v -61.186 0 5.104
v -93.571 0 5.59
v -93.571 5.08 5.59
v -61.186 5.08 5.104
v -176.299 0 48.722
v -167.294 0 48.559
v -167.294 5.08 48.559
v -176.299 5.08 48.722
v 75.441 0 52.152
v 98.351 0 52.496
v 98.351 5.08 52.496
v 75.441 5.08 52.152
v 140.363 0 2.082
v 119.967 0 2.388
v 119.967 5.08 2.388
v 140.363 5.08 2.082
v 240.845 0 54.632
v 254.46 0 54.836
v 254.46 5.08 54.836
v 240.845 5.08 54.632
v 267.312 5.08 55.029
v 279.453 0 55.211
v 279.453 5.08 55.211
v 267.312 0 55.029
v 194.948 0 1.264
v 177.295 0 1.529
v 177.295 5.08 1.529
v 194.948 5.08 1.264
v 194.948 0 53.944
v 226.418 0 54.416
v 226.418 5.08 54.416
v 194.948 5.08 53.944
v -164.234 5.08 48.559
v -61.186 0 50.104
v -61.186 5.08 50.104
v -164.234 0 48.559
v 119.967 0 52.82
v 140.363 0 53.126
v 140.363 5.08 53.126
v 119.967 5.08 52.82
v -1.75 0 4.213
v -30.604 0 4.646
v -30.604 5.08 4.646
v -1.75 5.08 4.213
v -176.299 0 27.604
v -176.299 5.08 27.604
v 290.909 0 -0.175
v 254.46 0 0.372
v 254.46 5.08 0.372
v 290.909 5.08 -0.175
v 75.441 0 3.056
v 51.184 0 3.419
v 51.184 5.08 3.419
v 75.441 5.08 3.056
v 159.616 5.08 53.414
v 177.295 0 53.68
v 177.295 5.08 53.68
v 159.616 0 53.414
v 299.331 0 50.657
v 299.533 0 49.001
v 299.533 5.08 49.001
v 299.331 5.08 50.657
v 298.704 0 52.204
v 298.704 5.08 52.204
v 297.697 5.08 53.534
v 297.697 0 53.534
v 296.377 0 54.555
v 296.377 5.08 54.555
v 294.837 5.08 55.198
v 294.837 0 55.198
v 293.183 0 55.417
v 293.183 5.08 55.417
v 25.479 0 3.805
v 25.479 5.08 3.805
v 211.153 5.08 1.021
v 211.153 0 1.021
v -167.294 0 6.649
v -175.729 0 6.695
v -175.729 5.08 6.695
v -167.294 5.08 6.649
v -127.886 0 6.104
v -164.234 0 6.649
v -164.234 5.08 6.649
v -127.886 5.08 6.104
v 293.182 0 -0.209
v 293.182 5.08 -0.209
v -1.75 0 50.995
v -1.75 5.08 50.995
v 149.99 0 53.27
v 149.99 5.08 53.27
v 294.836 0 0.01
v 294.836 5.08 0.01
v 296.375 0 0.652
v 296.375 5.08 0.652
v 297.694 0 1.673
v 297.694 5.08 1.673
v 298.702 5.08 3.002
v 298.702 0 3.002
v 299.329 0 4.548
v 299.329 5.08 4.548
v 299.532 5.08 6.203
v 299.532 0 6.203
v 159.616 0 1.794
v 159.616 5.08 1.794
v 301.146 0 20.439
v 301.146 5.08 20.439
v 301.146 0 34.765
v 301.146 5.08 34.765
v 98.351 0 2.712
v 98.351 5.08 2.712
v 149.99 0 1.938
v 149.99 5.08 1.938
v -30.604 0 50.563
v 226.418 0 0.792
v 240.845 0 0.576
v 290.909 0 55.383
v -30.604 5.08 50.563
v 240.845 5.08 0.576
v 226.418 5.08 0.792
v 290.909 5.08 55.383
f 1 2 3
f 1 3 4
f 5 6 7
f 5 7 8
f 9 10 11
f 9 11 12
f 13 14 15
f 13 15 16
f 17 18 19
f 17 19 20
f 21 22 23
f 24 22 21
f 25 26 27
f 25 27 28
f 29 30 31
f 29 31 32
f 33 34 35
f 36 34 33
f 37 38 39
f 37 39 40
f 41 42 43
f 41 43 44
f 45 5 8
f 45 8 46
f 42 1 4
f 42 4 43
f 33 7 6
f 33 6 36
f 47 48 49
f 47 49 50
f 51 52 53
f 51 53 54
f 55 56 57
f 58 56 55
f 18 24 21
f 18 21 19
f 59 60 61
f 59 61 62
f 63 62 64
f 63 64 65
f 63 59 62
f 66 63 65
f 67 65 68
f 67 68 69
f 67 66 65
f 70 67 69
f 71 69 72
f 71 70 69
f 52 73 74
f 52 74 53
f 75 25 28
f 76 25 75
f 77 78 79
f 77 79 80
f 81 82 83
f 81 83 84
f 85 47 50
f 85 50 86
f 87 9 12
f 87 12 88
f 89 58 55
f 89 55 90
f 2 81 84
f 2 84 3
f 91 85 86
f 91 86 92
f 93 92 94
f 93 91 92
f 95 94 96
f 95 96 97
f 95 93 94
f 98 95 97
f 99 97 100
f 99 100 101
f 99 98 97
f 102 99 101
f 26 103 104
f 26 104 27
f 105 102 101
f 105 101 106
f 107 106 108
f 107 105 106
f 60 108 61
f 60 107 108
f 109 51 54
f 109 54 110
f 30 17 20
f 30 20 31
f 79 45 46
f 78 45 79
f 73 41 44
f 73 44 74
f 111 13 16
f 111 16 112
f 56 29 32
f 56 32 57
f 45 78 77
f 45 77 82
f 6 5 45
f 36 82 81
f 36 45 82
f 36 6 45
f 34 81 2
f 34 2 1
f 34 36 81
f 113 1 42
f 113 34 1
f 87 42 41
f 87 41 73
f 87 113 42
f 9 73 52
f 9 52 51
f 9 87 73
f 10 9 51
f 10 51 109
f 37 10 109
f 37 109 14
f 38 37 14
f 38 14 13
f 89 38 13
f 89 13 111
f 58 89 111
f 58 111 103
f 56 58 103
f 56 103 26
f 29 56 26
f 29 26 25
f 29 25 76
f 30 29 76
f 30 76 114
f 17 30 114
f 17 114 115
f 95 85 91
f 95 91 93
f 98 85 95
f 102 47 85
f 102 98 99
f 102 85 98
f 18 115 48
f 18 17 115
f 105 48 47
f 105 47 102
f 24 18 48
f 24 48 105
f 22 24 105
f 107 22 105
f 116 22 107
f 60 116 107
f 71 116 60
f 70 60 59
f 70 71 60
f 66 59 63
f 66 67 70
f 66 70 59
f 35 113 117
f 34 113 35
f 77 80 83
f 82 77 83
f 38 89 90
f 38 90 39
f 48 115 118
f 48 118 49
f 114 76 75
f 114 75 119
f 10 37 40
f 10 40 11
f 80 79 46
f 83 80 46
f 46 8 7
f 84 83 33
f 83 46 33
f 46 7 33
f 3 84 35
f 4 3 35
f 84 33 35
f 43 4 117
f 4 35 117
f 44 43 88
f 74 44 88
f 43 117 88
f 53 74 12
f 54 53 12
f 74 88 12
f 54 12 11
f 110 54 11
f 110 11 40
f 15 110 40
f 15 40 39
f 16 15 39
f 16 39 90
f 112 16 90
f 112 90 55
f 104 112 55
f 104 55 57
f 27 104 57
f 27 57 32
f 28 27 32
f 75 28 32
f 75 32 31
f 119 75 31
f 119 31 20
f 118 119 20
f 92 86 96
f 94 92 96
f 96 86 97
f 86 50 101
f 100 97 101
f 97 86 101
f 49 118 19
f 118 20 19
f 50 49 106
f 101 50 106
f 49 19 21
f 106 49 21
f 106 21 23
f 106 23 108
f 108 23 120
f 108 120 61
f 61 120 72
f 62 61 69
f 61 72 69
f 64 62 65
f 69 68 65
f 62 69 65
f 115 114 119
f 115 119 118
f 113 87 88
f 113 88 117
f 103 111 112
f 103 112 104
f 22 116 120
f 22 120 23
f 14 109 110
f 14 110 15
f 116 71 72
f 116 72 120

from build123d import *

# Parameters (mm, degrees)
F0_W     = 3.0600779591
F0_H     = 20.955
F1_DEPTH = 5.08


# Not quite as in the source:
# - a feature names something its author has since deleted; it is built from what else it names


with BuildPart() as f1:
    # F0 (on Front) → F1 (new body)
    with BuildSketch(Plane.XZ):
        with BuildLine():
            Line((211.1527612069, 54.1871569779), (194.9475612069, 53.9441942956))
            Line((194.9475612069, 53.9441942956), (194.9475612069, 27.6040292631))
            Line((194.9475612069, 27.6040292631), (199.8751612069, 27.6040292631))
            ThreePointArc((199.8751612069, 27.6040292631), (203.0501612069, 30.7790292631), (206.2251612069, 27.6040292631))
            Line((206.2251612069, 27.6040292631), (211.1527612069, 27.6040292631))
            Line((211.1527612069, 27.6040292631), (211.1527612069, 54.1871569779))
        make_face()
        with BuildLine():
            Line((35.1561612069, 27.6040292631), (25.4787612069, 27.6040292631))
            Line((25.4787612069, 27.6040292631), (25.4787612069, 3.8046848733))
            Line((25.4787612069, 3.8046848733), (51.1835612069, 3.4192950591))
            Line((51.1835612069, 3.4192950591), (51.1835612069, 27.6040292631))
            Line((51.1835612069, 27.6040292631), (41.5061612069, 27.6040292631))
            ThreePointArc((41.5061612069, 27.6040292631), (38.3311612069, 24.4290292631), (35.1561612069, 27.6040292631))
        make_face()
        Polygon((75.4405612069, 52.1524397183), (51.1835612069, 51.7887573333), (51.1835612069, 27.6040292631), (75.4405612069, 27.6040292631), align=None)
        Polygon((119.9667612069, 52.8200158658), (98.3513612069, 52.4959386829), (98.3513612069, 27.6040292631), (119.9667612069, 27.6040292631), align=None)
        Polygon((-127.8864387931, 6.1040758796), (-93.5710387931, 5.589588094), (-93.5710387931, 27.6040292631), (-127.8864387931, 27.6040292631), align=None)
        with BuildLine():
            ThreePointArc((-19.3522387931, 27.6040292631), (-16.1772387931, 30.7790292631), (-13.0022387931, 27.6040292631))
            Line((-13.0022387931, 27.6040292631), (-1.7500387931, 27.6040292631))
            Line((-1.7500387931, 27.6040292631), (-1.7500387931, 50.9951300136))
            Line((-1.7500387931, 50.9951300136), (-30.6044387931, 50.5625193442))
            Line((-30.6044387931, 50.5625193442), (-30.6044387931, 27.6040292631))
            Line((-30.6044387931, 27.6040292631), (-19.3522387931, 27.6040292631))
        make_face()
        Polygon((-93.5710387931, 27.6040292631), (-93.5710387931, 49.6184684202), (-127.8864387931, 49.1039816117), (-127.8864387931, 27.6040292631), align=None)
        Polygon((-30.6044387931, 4.6455353771), (-30.6044387931, 27.6040292631), (-61.1860387931, 27.6040292631), (-61.1860387931, 5.1040426264), align=None)
        Polygon((51.1835612069, 27.6040292631), (51.1835612069, 3.4192950591), (75.4405612069, 3.0556119834), (75.4405612069, 27.6040292631), align=None)
        Polygon((119.9667612069, 27.6040292631), (119.9667612069, 2.388034568), (140.3629612069, 2.0822361285), (140.3629612069, 14.6379053581), (140.3629612069, 27.6040292631), align=None)
        Polygon((98.3513612069, 27.6040292631), (98.3513612069, 2.7121123663), (119.9667612069, 2.388034568), (119.9667612069, 27.6040292631), align=None)
        with BuildLine():
            Line((-74.2035387931, 27.6040292631), (-61.1860387931, 27.6040292631))
            Line((-61.1860387931, 27.6040292631), (-61.1860387931, 50.1040129656))
            Line((-61.1860387931, 50.1040129656), (-93.5710387931, 49.6184684202))
            Line((-93.5710387931, 49.6184684202), (-93.5710387931, 27.6040292631))
            Line((-93.5710387931, 27.6040292631), (-80.5535387931, 27.6040292631))
            ThreePointArc((-80.5535387931, 27.6040292631), (-77.3785387931, 30.7790292631), (-74.2035387931, 27.6040292631))
        make_face()
        with BuildLine():
            Line((25.4787612069, 51.403368251), (25.4787612069, 27.6040292631))
            Line((25.4787612069, 27.6040292631), (35.1561612069, 27.6040292631))
            ThreePointArc((35.1561612069, 27.6040292631), (38.3311612069, 30.7790292631), (41.5061612069, 27.6040292631))
            Line((41.5061612069, 27.6040292631), (51.1835612069, 27.6040292631))
            Line((51.1835612069, 27.6040292631), (51.1835612069, 51.7887573333))
            Line((51.1835612069, 51.7887573333), (25.4787612069, 51.403368251))
        make_face()
        Polygon((-61.1860387931, 27.6040292631), (-30.6044387931, 27.6040292631), (-30.6044387931, 50.5625193442), (-61.1860387931, 50.1040129656), align=None)
        Polygon((-164.2338387931, 6.6490292631), (-127.8864387931, 6.1040758796), (-127.8864387931, 27.6040292631), (-164.2338387931, 27.6040292631), align=None)
        with BuildLine():
            Line((-167.2939167522, 27.6040292631), (-167.2939167522, 48.5590292631))
            add(Edge.make_bspline(
                [(-167.2939167522, 48.5590292631), (-169.3608924509, 48.5160966839), (-172.2759226046, 48.4555494006), (-175.4017391189, 48.6513352899), (-176.2988387931, 48.7219685213)],
                knots=[0, 0, 0, 0, 0.0767284167, 0.1082616947, 0.1082616947, 0.1082616947, 0.1082616947], degree=3))
            Line((-176.2988387931, 48.7219685213), (-176.2988387931, 27.6040292631))
            Line((-176.2988387931, 27.6040292631), (-167.2939167522, 27.6040292631))
        make_face()
        with BuildLine():
            Line((75.4405612069, 27.6040292631), (75.4405612069, 3.0556119834))
            Line((75.4405612069, 3.0556119834), (98.3513612069, 2.7121123663))
            Line((98.3513612069, 2.7121123663), (98.3513612069, 27.6040292631))
            Line((98.3513612069, 27.6040292631), (90.0709612069, 27.6040292631))
            ThreePointArc((90.0709612069, 27.6040292631), (86.8959612069, 24.4290292631), (83.7209612069, 27.6040292631))
            Line((83.7209612069, 27.6040292631), (75.4405612069, 27.6040292631))
        make_face()
        Polygon((177.2945612069, 27.6040292631), (177.2945612069, 1.5285238855), (194.9475612069, 1.2638540032), (194.9475612069, 27.6040292631), align=None)
        with BuildLine():
            Line((98.3513612069, 52.4959386829), (75.4405612069, 52.1524397183))
            Line((75.4405612069, 52.1524397183), (75.4405612069, 27.6040292631))
            Line((75.4405612069, 27.6040292631), (83.7209612069, 27.6040292631))
            ThreePointArc((83.7209612069, 27.6040292631), (86.8959612069, 30.7790292631), (90.0709612069, 27.6040292631))
            Line((90.0709612069, 27.6040292631), (98.3513612069, 27.6040292631))
            Line((98.3513612069, 27.6040292631), (98.3513612069, 52.4959386829))
        make_face()
        with BuildLine():
            Line((194.9475612069, 27.6040292631), (194.9475612069, 1.2638540032))
            Line((194.9475612069, 1.2638540032), (211.1527612069, 1.0208908594))
            Line((211.1527612069, 1.0208908594), (211.1527612069, 27.6040292631))
            Line((211.1527612069, 27.6040292631), (206.2251612069, 27.6040292631))
            ThreePointArc((206.2251612069, 27.6040292631), (203.0501612069, 24.4290292631), (199.8751612069, 27.6040292631))
            Line((199.8751612069, 27.6040292631), (194.9475612069, 27.6040292631))
        make_face()
        Polygon((-127.8864387931, 27.6040292631), (-127.8864387931, 49.1039816117), (-164.2338387931, 48.5590292631), (-164.2338387931, 27.6040292631), align=None)
        Polygon((140.3629612069, 53.1258137246), (119.9667612069, 52.8200158658), (119.9667612069, 27.6040292631), (140.3629612069, 27.6040292631), (140.3629612069, 40.5701442208), align=None)
        with BuildLine():
            Line((-1.7500387931, 27.6040292631), (-13.0022387931, 27.6040292631))
            ThreePointArc((-13.0022387931, 27.6040292631), (-16.1772387931, 24.4290292631), (-19.3522387931, 27.6040292631))
            Line((-19.3522387931, 27.6040292631), (-30.6044387931, 27.6040292631))
            Line((-30.6044387931, 27.6040292631), (-30.6044387931, 4.6455353771))
            Line((-30.6044387931, 4.6455353771), (-1.7500387931, 4.212923886))
            Line((-1.7500387931, 4.212923886), (-1.7500387931, 27.6040292631))
        make_face()
        Polygon((267.3121612069, 27.6040292631), (267.3121612069, 0.1788978957), (279.4533612069, -0.0031340521), (279.4533612069, 27.6040292631), align=None)
        Polygon((194.9475612069, 53.9441942956), (177.2945612069, 53.679524916), (177.2945612069, 27.6040292631), (194.9475612069, 27.6040292631), align=None)
        with BuildLine():
            Line((290.9087612069, 55.382929427), (279.4533612069, 55.2111799446))
            Line((279.4533612069, 55.2111799446), (279.4533612069, 27.6040292631))
            Line((279.4533612069, 27.6040292631), (282.0060612069, 27.6040292631))
            ThreePointArc((282.0060612069, 27.6040292631), (285.1810612069, 30.7790292631), (288.3560612069, 27.6040292631))
            Line((288.3560612069, 27.6040292631), (290.9087612069, 27.6040292631))
            Line((290.9087612069, 27.6040292631), (290.9087612069, 55.382929427))
        make_face()
        Polygon((279.4533612069, 55.2111799446), (267.3121612069, 55.0291483425), (267.3121612069, 27.6040292631), (279.4533612069, 27.6040292631), align=None)
        Polygon((177.2945612069, 53.679524916), (159.6161612069, 53.4144747171), (159.6161612069, 40.5701442208), (159.6161612069, 27.6040292631), (177.2945612069, 27.6040292631), align=None)
        with BuildLine():
            Line((140.3629612069, 14.6379053581), (140.3629612069, 2.0822361285))
            Line((140.3629612069, 2.0822361285), (149.9895612069, 1.9379053581))
            Line((149.9895612069, 1.9379053581), (149.9895612069, 11.4629053581))
            ThreePointArc((149.9895612069, 11.4629053581), (147.7444971767, 12.3928413278), (146.8145612069, 14.6379053581))
            Line((146.8145612069, 14.6379053581), (140.3629612069, 14.6379053581))
        make_face()
        with BuildLine():
            Line((226.4181612069, 27.6040292631), (226.4181612069, 0.7920180547))
            Line((226.4181612069, 0.7920180547), (240.8453612069, 0.5757123092))
            Line((240.8453612069, 0.5757123092), (240.8453612069, 27.6040292631))
            Line((240.8453612069, 27.6040292631), (236.8067612069, 27.6040292631))
            ThreePointArc((236.8067612069, 27.6040292631), (233.6317612069, 24.4290292631), (230.4567612069, 27.6040292631))
            Line((230.4567612069, 27.6040292631), (226.4181612069, 27.6040292631))
        make_face()
        Polygon((211.1527612069, 27.6040292631), (211.1527612069, 1.0208908594), (226.4181612069, 0.7920180547), (226.4181612069, 27.6040292631), align=None)
        Polygon((254.4597612069, 54.8364538014), (240.8453612069, 54.6323346827), (240.8453612069, 27.6040292631), (254.4597612069, 27.6040292631), align=None)
        Polygon((159.6161612069, 14.6379053581), (159.6161612069, 1.7935745878), (177.2945612069, 1.5285238855), (177.2945612069, 27.6040292631), (159.6161612069, 27.6040292631), align=None)
        with BuildLine():
            Line((267.3121612069, 55.0291483425), (254.4597612069, 54.8364538014))
            Line((254.4597612069, 54.8364538014), (254.4597612069, 27.6040292631))
            Line((254.4597612069, 27.6040292631), (257.7109612069, 27.6040292631))
            ThreePointArc((257.7109612069, 27.6040292631), (260.8859612069, 30.7790292631), (264.0609612069, 27.6040292631))
            Line((264.0609612069, 27.6040292631), (267.3121612069, 27.6040292631))
            Line((267.3121612069, 27.6040292631), (267.3121612069, 55.0291483425))
        make_face()
        with BuildLine():
            Line((149.9895612069, 53.2701442208), (140.3629612069, 53.1258137246))
            Line((140.3629612069, 53.1258137246), (140.3629612069, 40.5701442208))
            Line((140.3629612069, 40.5701442208), (146.8145612069, 40.5701442208))
            ThreePointArc((146.8145612069, 40.5701442208), (147.7444971767, 42.8152082511), (149.9895612069, 43.7451442208))
            Line((149.9895612069, 43.7451442208), (149.9895612069, 53.2701442208))
        make_face()
        with BuildLine():
            Line((240.8453612069, 54.6323346827), (226.4181612069, 54.4160293479))
            Line((226.4181612069, 54.4160293479), (226.4181612069, 27.6040292631))
            Line((226.4181612069, 27.6040292631), (230.4567612069, 27.6040292631))
            ThreePointArc((230.4567612069, 27.6040292631), (233.6317612069, 30.7790292631), (236.8067612069, 27.6040292631))
            Line((236.8067612069, 27.6040292631), (240.8453612069, 27.6040292631))
            Line((240.8453612069, 27.6040292631), (240.8453612069, 54.6323346827))
        make_face()
        Polygon((226.4181612069, 54.4160293479), (211.1527612069, 54.1871569779), (211.1527612069, 27.6040292631), (226.4181612069, 27.6040292631), align=None)
        Polygon((-1.7500387931, 50.9951300136), (-1.7500387931, 27.6040292631), (25.4787612069, 27.6040292631), (25.4787612069, 51.403368251), align=None)
        Polygon((25.4787612069, 27.6040292631), (-1.7500387931, 27.6040292631), (-1.7500387931, 4.212923886), (25.4787612069, 3.8046848733), align=None)
        Polygon((240.8453612069, 27.6040292631), (240.8453612069, 0.5757123092), (254.4597612069, 0.3715928028), (254.4597612069, 27.6040292631), align=None)
        with BuildLine():
            Line((-61.1860387931, 5.1040426264), (-61.1860387931, 27.6040292631))
            Line((-61.1860387931, 27.6040292631), (-74.2035387931, 27.6040292631))
            ThreePointArc((-74.2035387931, 27.6040292631), (-77.3785387931, 24.4290292631), (-80.5535387931, 27.6040292631))
            Line((-80.5535387931, 27.6040292631), (-93.5710387931, 27.6040292631))
            Line((-93.5710387931, 27.6040292631), (-93.5710387931, 5.589588094))
            Line((-93.5710387931, 5.589588094), (-61.1860387931, 5.1040426264))
        make_face()
        with BuildLine():
            Line((254.4597612069, 27.6040292631), (254.4597612069, 0.3715928028))
            Line((254.4597612069, 0.3715928028), (267.3121612069, 0.1788978957))
            Line((267.3121612069, 0.1788978957), (267.3121612069, 27.6040292631))
            Line((267.3121612069, 27.6040292631), (264.0609612069, 27.6040292631))
            ThreePointArc((264.0609612069, 27.6040292631), (260.8859612069, 24.4290292631), (257.7109612069, 27.6040292631))
            Line((257.7109612069, 27.6040292631), (254.4597612069, 27.6040292631))
        make_face()
        with BuildLine():
            ThreePointArc((41.5061612069, 27.6040292631), (38.3311612069, 30.7790292631), (35.1561612069, 27.6040292631))
            Line((35.1561612069, 27.6040292631), (41.5061612069, 27.6040292631))
        make_face()
        with BuildLine():
            Line((41.5061612069, 27.6040292631), (35.1561612069, 27.6040292631))
            ThreePointArc((35.1561612069, 27.6040292631), (38.3311612069, 24.4290292631), (41.5061612069, 27.6040292631))
        make_face()
        with BuildLine():
            ThreePointArc((90.0709612069, 27.6040292631), (86.8959612069, 30.7790292631), (83.7209612069, 27.6040292631))
            Line((83.7209612069, 27.6040292631), (90.0709612069, 27.6040292631))
        make_face()
        with BuildLine():
            Line((149.9895612069, 27.6040292631), (140.3629612069, 27.6040292631))
            Line((140.3629612069, 27.6040292631), (140.3629612069, 14.6379053581))
            Line((140.3629612069, 14.6379053581), (146.8145612069, 14.6379053581))
            ThreePointArc((146.8145612069, 14.6379053581), (147.7444971767, 16.8829693884), (149.9895612069, 17.8129053581))
            Line((149.9895612069, 17.8129053581), (149.9895612069, 27.6040292631))
        make_face()
        with BuildLine():
            Line((-80.5535387931, 27.6040292631), (-74.2035387931, 27.6040292631))
            ThreePointArc((-74.2035387931, 27.6040292631), (-77.3785387931, 30.7790292631), (-80.5535387931, 27.6040292631))
        make_face()
        with BuildLine():
            ThreePointArc((-80.5535387931, 27.6040292631), (-77.3785387931, 24.4290292631), (-74.2035387931, 27.6040292631))
            Line((-74.2035387931, 27.6040292631), (-80.5535387931, 27.6040292631))
        make_face()
        with BuildLine():
            Line((-19.3522387931, 27.6040292631), (-13.0022387931, 27.6040292631))
            ThreePointArc((-13.0022387931, 27.6040292631), (-16.1772387931, 30.7790292631), (-19.3522387931, 27.6040292631))
        make_face()
        with BuildLine():
            ThreePointArc((-19.3522387931, 27.6040292631), (-16.1772387931, 24.4290292631), (-13.0022387931, 27.6040292631))
            Line((-13.0022387931, 27.6040292631), (-19.3522387931, 27.6040292631))
        make_face()
        with BuildLine():
            Line((90.0709612069, 27.6040292631), (83.7209612069, 27.6040292631))
            ThreePointArc((83.7209612069, 27.6040292631), (86.8959612069, 24.4290292631), (90.0709612069, 27.6040292631))
        make_face()
        with BuildLine():
            Line((279.4533612069, 27.6040292631), (279.4533612069, -0.0031340521))
            Line((279.4533612069, -0.0031340521), (290.9087612069, -0.1748838606))
            Line((290.9087612069, -0.1748838606), (290.9087612069, 27.6040292631))
            Line((290.9087612069, 27.6040292631), (288.3560612069, 27.6040292631))
            ThreePointArc((288.3560612069, 27.6040292631), (285.1810612069, 24.4290292631), (282.0060612069, 27.6040292631))
            Line((282.0060612069, 27.6040292631), (279.4533612069, 27.6040292631))
        make_face()
        with BuildLine():
            Line((159.6161612069, 27.6040292631), (149.9895612069, 27.6040292631))
            Line((149.9895612069, 27.6040292631), (149.9895612069, 17.8129053581))
            ThreePointArc((149.9895612069, 17.8129053581), (152.2346252372, 16.8829693884), (153.1645612069, 14.6379053581))
            Line((153.1645612069, 14.6379053581), (159.6161612069, 14.6379053581))
            Line((159.6161612069, 14.6379053581), (159.6161612069, 27.6040292631))
        make_face()
        with BuildLine():
            ThreePointArc((299.5327314187, 49.000836976), (297.6965766308, 53.53366288), (293.1831626072, 55.4170292631))
            Line((293.1831626072, 55.4170292631), (293.1827280197, 27.6040292631))
            Line((293.1827280197, 27.6040292631), (293.1822934321, -0.2089707301))
            ThreePointArc((293.1822934321, -0.2089707301), (297.6944667131, 1.6729676451), (299.5320740528, 6.2033759083))
            ThreePointArc((299.5320740528, 6.2033759083), (301.3481611896, 27.6020785522), (299.5327314187, 49.000836976))
        make_face()
        with BuildLine():
            Line((146.8145612069, 40.5701442208), (140.3629612069, 40.5701442208))
            Line((140.3629612069, 40.5701442208), (140.3629612069, 27.6040292631))
            Line((140.3629612069, 27.6040292631), (149.9895612069, 27.6040292631))
            Line((149.9895612069, 27.6040292631), (149.9895612069, 37.3951442208))
            ThreePointArc((149.9895612069, 37.3951442208), (147.7444971767, 38.3250801906), (146.8145612069, 40.5701442208))
        make_face()
        with BuildLine():
            Line((149.9895612069, 37.3951442208), (149.9895612069, 27.6040292631))
            Line((149.9895612069, 27.6040292631), (159.6161612069, 27.6040292631))
            Line((159.6161612069, 27.6040292631), (159.6161612069, 40.5701442208))
            Line((159.6161612069, 40.5701442208), (153.1645612069, 40.5701442208))
            ThreePointArc((153.1645612069, 40.5701442208), (152.2346252372, 38.3250801906), (149.9895612069, 37.3951442208))
        make_face()
        with BuildLine():
            Line((149.9895612069, 11.4629053581), (149.9895612069, 1.9379053581))
            Line((149.9895612069, 1.9379053581), (159.6161612069, 1.7935745878))
            Line((159.6161612069, 1.7935745878), (159.6161612069, 14.6379053581))
            Line((159.6161612069, 14.6379053581), (153.1645612069, 14.6379053581))
            ThreePointArc((153.1645612069, 14.6379053581), (152.2346252372, 12.3928413278), (149.9895612069, 11.4629053581))
        make_face()
        with BuildLine():
            Line((159.6161612069, 53.4144747171), (149.9895612069, 53.2701442208))
            Line((149.9895612069, 53.2701442208), (149.9895612069, 43.7451442208))
            ThreePointArc((149.9895612069, 43.7451442208), (152.2346252372, 42.8152082511), (153.1645612069, 40.5701442208))
            Line((153.1645612069, 40.5701442208), (159.6161612069, 40.5701442208))
            Line((159.6161612069, 40.5701442208), (159.6161612069, 53.4144747171))
        make_face()
        with BuildLine():
            ThreePointArc((149.9895612069, 17.8129053581), (147.7444971767, 16.8829693884), (146.8145612069, 14.6379053581))
            Line((146.8145612069, 14.6379053581), (149.9895612069, 14.6379053581))
            Line((149.9895612069, 14.6379053581), (149.9895612069, 17.8129053581))
        make_face()
        with BuildLine():
            Line((149.9895612069, 40.5701442208), (149.9895612069, 43.7451442208))
            ThreePointArc((149.9895612069, 43.7451442208), (147.7444971767, 42.8152082511), (146.8145612069, 40.5701442208))
            Line((146.8145612069, 40.5701442208), (149.9895612069, 40.5701442208))
        make_face()
        with BuildLine():
            Line((206.2251612069, 27.6040292631), (199.8751612069, 27.6040292631))
            ThreePointArc((199.8751612069, 27.6040292631), (203.0501612069, 24.4290292631), (206.2251612069, 27.6040292631))
        make_face()
        with BuildLine():
            ThreePointArc((206.2251612069, 27.6040292631), (203.0501612069, 30.7790292631), (199.8751612069, 27.6040292631))
            Line((199.8751612069, 27.6040292631), (206.2251612069, 27.6040292631))
        make_face()
        with BuildLine():
            ThreePointArc((236.8067612069, 27.6040292631), (233.6317612069, 30.7790292631), (230.4567612069, 27.6040292631))
            Line((230.4567612069, 27.6040292631), (236.8067612069, 27.6040292631))
        make_face()
        with BuildLine():
            ThreePointArc((288.3560612069, 27.6040292631), (285.1810612069, 30.7790292631), (282.0060612069, 27.6040292631))
            Line((282.0060612069, 27.6040292631), (288.3560612069, 27.6040292631))
        make_face()
        with BuildLine():
            Line((236.8067612069, 27.6040292631), (230.4567612069, 27.6040292631))
            ThreePointArc((230.4567612069, 27.6040292631), (233.6317612069, 24.4290292631), (236.8067612069, 27.6040292631))
        make_face()
        with BuildLine():
            ThreePointArc((264.0609612069, 27.6040292631), (260.8859612069, 30.7790292631), (257.7109612069, 27.6040292631))
            Line((257.7109612069, 27.6040292631), (264.0609612069, 27.6040292631))
        make_face()
        with BuildLine():
            Line((264.0609612069, 27.6040292631), (257.7109612069, 27.6040292631))
            ThreePointArc((257.7109612069, 27.6040292631), (260.8859612069, 24.4290292631), (264.0609612069, 27.6040292631))
        make_face()
        with BuildLine():
            Line((288.3560612069, 27.6040292631), (282.0060612069, 27.6040292631))
            ThreePointArc((282.0060612069, 27.6040292631), (285.1810612069, 24.4290292631), (288.3560612069, 27.6040292631))
        make_face()
        Polygon((290.9087612069, 27.6040292631), (290.9087612069, -0.1748838606), (293.1822934321, -0.2089707301), (293.1827280197, 27.6040292631), align=None)
        with BuildLine():
            ThreePointArc((153.1645612069, 14.6379053581), (152.2346252372, 16.8829693884), (149.9895612069, 17.8129053581))
            Line((149.9895612069, 17.8129053581), (149.9895612069, 14.6379053581))
            Line((149.9895612069, 14.6379053581), (153.1645612069, 14.6379053581))
        make_face()
        with BuildLine():
            ThreePointArc((146.8145612069, 14.6379053581), (147.7444971767, 12.3928413278), (149.9895612069, 11.4629053581))
            Line((149.9895612069, 11.4629053581), (149.9895612069, 14.6379053581))
            Line((149.9895612069, 14.6379053581), (146.8145612069, 14.6379053581))
        make_face()
        Polygon((293.1831626072, 55.4170292631), (290.9087612069, 55.382929427), (290.9087612069, 27.6040292631), (293.1827280197, 27.6040292631), align=None)
        with BuildLine():
            ThreePointArc((149.9895612069, 37.3951442208), (152.2346252372, 38.3250801906), (153.1645612069, 40.5701442208))
            Line((153.1645612069, 40.5701442208), (149.9895612069, 40.5701442208))
            Line((149.9895612069, 40.5701442208), (149.9895612069, 37.3951442208))
        make_face()
        with Locations((-165.7638777726, 38.0815292631)):
            Rectangle(F0_W, F0_H)
        with Locations((-165.7638777726, 17.1265292631)):
            Rectangle(F0_W, F0_H)
        with BuildLine():
            Line((149.9895612069, 14.6379053581), (149.9895612069, 11.4629053581))
            ThreePointArc((149.9895612069, 11.4629053581), (152.2346252372, 12.3928413278), (153.1645612069, 14.6379053581))
            Line((153.1645612069, 14.6379053581), (149.9895612069, 14.6379053581))
        make_face()
        with BuildLine():
            Line((149.9895612069, 40.5701442208), (146.8145612069, 40.5701442208))
            ThreePointArc((146.8145612069, 40.5701442208), (147.7444971767, 38.3250801906), (149.9895612069, 37.3951442208))
            Line((149.9895612069, 37.3951442208), (149.9895612069, 40.5701442208))
        make_face()
        with BuildLine():
            ThreePointArc((153.1645612069, 40.5701442208), (152.2346252372, 42.8152082511), (149.9895612069, 43.7451442208))
            Line((149.9895612069, 43.7451442208), (149.9895612069, 40.5701442208))
            Line((149.9895612069, 40.5701442208), (153.1645612069, 40.5701442208))
        make_face()
        Polygon((-175.7287366174, 6.6946032245), (-167.2939167522, 6.6490292631), (-167.2939167522, 27.6040292631), (-176.2988387931, 27.6040292631), align=None)
    extrude(amount=-F1_DEPTH)


solid = f1.part
